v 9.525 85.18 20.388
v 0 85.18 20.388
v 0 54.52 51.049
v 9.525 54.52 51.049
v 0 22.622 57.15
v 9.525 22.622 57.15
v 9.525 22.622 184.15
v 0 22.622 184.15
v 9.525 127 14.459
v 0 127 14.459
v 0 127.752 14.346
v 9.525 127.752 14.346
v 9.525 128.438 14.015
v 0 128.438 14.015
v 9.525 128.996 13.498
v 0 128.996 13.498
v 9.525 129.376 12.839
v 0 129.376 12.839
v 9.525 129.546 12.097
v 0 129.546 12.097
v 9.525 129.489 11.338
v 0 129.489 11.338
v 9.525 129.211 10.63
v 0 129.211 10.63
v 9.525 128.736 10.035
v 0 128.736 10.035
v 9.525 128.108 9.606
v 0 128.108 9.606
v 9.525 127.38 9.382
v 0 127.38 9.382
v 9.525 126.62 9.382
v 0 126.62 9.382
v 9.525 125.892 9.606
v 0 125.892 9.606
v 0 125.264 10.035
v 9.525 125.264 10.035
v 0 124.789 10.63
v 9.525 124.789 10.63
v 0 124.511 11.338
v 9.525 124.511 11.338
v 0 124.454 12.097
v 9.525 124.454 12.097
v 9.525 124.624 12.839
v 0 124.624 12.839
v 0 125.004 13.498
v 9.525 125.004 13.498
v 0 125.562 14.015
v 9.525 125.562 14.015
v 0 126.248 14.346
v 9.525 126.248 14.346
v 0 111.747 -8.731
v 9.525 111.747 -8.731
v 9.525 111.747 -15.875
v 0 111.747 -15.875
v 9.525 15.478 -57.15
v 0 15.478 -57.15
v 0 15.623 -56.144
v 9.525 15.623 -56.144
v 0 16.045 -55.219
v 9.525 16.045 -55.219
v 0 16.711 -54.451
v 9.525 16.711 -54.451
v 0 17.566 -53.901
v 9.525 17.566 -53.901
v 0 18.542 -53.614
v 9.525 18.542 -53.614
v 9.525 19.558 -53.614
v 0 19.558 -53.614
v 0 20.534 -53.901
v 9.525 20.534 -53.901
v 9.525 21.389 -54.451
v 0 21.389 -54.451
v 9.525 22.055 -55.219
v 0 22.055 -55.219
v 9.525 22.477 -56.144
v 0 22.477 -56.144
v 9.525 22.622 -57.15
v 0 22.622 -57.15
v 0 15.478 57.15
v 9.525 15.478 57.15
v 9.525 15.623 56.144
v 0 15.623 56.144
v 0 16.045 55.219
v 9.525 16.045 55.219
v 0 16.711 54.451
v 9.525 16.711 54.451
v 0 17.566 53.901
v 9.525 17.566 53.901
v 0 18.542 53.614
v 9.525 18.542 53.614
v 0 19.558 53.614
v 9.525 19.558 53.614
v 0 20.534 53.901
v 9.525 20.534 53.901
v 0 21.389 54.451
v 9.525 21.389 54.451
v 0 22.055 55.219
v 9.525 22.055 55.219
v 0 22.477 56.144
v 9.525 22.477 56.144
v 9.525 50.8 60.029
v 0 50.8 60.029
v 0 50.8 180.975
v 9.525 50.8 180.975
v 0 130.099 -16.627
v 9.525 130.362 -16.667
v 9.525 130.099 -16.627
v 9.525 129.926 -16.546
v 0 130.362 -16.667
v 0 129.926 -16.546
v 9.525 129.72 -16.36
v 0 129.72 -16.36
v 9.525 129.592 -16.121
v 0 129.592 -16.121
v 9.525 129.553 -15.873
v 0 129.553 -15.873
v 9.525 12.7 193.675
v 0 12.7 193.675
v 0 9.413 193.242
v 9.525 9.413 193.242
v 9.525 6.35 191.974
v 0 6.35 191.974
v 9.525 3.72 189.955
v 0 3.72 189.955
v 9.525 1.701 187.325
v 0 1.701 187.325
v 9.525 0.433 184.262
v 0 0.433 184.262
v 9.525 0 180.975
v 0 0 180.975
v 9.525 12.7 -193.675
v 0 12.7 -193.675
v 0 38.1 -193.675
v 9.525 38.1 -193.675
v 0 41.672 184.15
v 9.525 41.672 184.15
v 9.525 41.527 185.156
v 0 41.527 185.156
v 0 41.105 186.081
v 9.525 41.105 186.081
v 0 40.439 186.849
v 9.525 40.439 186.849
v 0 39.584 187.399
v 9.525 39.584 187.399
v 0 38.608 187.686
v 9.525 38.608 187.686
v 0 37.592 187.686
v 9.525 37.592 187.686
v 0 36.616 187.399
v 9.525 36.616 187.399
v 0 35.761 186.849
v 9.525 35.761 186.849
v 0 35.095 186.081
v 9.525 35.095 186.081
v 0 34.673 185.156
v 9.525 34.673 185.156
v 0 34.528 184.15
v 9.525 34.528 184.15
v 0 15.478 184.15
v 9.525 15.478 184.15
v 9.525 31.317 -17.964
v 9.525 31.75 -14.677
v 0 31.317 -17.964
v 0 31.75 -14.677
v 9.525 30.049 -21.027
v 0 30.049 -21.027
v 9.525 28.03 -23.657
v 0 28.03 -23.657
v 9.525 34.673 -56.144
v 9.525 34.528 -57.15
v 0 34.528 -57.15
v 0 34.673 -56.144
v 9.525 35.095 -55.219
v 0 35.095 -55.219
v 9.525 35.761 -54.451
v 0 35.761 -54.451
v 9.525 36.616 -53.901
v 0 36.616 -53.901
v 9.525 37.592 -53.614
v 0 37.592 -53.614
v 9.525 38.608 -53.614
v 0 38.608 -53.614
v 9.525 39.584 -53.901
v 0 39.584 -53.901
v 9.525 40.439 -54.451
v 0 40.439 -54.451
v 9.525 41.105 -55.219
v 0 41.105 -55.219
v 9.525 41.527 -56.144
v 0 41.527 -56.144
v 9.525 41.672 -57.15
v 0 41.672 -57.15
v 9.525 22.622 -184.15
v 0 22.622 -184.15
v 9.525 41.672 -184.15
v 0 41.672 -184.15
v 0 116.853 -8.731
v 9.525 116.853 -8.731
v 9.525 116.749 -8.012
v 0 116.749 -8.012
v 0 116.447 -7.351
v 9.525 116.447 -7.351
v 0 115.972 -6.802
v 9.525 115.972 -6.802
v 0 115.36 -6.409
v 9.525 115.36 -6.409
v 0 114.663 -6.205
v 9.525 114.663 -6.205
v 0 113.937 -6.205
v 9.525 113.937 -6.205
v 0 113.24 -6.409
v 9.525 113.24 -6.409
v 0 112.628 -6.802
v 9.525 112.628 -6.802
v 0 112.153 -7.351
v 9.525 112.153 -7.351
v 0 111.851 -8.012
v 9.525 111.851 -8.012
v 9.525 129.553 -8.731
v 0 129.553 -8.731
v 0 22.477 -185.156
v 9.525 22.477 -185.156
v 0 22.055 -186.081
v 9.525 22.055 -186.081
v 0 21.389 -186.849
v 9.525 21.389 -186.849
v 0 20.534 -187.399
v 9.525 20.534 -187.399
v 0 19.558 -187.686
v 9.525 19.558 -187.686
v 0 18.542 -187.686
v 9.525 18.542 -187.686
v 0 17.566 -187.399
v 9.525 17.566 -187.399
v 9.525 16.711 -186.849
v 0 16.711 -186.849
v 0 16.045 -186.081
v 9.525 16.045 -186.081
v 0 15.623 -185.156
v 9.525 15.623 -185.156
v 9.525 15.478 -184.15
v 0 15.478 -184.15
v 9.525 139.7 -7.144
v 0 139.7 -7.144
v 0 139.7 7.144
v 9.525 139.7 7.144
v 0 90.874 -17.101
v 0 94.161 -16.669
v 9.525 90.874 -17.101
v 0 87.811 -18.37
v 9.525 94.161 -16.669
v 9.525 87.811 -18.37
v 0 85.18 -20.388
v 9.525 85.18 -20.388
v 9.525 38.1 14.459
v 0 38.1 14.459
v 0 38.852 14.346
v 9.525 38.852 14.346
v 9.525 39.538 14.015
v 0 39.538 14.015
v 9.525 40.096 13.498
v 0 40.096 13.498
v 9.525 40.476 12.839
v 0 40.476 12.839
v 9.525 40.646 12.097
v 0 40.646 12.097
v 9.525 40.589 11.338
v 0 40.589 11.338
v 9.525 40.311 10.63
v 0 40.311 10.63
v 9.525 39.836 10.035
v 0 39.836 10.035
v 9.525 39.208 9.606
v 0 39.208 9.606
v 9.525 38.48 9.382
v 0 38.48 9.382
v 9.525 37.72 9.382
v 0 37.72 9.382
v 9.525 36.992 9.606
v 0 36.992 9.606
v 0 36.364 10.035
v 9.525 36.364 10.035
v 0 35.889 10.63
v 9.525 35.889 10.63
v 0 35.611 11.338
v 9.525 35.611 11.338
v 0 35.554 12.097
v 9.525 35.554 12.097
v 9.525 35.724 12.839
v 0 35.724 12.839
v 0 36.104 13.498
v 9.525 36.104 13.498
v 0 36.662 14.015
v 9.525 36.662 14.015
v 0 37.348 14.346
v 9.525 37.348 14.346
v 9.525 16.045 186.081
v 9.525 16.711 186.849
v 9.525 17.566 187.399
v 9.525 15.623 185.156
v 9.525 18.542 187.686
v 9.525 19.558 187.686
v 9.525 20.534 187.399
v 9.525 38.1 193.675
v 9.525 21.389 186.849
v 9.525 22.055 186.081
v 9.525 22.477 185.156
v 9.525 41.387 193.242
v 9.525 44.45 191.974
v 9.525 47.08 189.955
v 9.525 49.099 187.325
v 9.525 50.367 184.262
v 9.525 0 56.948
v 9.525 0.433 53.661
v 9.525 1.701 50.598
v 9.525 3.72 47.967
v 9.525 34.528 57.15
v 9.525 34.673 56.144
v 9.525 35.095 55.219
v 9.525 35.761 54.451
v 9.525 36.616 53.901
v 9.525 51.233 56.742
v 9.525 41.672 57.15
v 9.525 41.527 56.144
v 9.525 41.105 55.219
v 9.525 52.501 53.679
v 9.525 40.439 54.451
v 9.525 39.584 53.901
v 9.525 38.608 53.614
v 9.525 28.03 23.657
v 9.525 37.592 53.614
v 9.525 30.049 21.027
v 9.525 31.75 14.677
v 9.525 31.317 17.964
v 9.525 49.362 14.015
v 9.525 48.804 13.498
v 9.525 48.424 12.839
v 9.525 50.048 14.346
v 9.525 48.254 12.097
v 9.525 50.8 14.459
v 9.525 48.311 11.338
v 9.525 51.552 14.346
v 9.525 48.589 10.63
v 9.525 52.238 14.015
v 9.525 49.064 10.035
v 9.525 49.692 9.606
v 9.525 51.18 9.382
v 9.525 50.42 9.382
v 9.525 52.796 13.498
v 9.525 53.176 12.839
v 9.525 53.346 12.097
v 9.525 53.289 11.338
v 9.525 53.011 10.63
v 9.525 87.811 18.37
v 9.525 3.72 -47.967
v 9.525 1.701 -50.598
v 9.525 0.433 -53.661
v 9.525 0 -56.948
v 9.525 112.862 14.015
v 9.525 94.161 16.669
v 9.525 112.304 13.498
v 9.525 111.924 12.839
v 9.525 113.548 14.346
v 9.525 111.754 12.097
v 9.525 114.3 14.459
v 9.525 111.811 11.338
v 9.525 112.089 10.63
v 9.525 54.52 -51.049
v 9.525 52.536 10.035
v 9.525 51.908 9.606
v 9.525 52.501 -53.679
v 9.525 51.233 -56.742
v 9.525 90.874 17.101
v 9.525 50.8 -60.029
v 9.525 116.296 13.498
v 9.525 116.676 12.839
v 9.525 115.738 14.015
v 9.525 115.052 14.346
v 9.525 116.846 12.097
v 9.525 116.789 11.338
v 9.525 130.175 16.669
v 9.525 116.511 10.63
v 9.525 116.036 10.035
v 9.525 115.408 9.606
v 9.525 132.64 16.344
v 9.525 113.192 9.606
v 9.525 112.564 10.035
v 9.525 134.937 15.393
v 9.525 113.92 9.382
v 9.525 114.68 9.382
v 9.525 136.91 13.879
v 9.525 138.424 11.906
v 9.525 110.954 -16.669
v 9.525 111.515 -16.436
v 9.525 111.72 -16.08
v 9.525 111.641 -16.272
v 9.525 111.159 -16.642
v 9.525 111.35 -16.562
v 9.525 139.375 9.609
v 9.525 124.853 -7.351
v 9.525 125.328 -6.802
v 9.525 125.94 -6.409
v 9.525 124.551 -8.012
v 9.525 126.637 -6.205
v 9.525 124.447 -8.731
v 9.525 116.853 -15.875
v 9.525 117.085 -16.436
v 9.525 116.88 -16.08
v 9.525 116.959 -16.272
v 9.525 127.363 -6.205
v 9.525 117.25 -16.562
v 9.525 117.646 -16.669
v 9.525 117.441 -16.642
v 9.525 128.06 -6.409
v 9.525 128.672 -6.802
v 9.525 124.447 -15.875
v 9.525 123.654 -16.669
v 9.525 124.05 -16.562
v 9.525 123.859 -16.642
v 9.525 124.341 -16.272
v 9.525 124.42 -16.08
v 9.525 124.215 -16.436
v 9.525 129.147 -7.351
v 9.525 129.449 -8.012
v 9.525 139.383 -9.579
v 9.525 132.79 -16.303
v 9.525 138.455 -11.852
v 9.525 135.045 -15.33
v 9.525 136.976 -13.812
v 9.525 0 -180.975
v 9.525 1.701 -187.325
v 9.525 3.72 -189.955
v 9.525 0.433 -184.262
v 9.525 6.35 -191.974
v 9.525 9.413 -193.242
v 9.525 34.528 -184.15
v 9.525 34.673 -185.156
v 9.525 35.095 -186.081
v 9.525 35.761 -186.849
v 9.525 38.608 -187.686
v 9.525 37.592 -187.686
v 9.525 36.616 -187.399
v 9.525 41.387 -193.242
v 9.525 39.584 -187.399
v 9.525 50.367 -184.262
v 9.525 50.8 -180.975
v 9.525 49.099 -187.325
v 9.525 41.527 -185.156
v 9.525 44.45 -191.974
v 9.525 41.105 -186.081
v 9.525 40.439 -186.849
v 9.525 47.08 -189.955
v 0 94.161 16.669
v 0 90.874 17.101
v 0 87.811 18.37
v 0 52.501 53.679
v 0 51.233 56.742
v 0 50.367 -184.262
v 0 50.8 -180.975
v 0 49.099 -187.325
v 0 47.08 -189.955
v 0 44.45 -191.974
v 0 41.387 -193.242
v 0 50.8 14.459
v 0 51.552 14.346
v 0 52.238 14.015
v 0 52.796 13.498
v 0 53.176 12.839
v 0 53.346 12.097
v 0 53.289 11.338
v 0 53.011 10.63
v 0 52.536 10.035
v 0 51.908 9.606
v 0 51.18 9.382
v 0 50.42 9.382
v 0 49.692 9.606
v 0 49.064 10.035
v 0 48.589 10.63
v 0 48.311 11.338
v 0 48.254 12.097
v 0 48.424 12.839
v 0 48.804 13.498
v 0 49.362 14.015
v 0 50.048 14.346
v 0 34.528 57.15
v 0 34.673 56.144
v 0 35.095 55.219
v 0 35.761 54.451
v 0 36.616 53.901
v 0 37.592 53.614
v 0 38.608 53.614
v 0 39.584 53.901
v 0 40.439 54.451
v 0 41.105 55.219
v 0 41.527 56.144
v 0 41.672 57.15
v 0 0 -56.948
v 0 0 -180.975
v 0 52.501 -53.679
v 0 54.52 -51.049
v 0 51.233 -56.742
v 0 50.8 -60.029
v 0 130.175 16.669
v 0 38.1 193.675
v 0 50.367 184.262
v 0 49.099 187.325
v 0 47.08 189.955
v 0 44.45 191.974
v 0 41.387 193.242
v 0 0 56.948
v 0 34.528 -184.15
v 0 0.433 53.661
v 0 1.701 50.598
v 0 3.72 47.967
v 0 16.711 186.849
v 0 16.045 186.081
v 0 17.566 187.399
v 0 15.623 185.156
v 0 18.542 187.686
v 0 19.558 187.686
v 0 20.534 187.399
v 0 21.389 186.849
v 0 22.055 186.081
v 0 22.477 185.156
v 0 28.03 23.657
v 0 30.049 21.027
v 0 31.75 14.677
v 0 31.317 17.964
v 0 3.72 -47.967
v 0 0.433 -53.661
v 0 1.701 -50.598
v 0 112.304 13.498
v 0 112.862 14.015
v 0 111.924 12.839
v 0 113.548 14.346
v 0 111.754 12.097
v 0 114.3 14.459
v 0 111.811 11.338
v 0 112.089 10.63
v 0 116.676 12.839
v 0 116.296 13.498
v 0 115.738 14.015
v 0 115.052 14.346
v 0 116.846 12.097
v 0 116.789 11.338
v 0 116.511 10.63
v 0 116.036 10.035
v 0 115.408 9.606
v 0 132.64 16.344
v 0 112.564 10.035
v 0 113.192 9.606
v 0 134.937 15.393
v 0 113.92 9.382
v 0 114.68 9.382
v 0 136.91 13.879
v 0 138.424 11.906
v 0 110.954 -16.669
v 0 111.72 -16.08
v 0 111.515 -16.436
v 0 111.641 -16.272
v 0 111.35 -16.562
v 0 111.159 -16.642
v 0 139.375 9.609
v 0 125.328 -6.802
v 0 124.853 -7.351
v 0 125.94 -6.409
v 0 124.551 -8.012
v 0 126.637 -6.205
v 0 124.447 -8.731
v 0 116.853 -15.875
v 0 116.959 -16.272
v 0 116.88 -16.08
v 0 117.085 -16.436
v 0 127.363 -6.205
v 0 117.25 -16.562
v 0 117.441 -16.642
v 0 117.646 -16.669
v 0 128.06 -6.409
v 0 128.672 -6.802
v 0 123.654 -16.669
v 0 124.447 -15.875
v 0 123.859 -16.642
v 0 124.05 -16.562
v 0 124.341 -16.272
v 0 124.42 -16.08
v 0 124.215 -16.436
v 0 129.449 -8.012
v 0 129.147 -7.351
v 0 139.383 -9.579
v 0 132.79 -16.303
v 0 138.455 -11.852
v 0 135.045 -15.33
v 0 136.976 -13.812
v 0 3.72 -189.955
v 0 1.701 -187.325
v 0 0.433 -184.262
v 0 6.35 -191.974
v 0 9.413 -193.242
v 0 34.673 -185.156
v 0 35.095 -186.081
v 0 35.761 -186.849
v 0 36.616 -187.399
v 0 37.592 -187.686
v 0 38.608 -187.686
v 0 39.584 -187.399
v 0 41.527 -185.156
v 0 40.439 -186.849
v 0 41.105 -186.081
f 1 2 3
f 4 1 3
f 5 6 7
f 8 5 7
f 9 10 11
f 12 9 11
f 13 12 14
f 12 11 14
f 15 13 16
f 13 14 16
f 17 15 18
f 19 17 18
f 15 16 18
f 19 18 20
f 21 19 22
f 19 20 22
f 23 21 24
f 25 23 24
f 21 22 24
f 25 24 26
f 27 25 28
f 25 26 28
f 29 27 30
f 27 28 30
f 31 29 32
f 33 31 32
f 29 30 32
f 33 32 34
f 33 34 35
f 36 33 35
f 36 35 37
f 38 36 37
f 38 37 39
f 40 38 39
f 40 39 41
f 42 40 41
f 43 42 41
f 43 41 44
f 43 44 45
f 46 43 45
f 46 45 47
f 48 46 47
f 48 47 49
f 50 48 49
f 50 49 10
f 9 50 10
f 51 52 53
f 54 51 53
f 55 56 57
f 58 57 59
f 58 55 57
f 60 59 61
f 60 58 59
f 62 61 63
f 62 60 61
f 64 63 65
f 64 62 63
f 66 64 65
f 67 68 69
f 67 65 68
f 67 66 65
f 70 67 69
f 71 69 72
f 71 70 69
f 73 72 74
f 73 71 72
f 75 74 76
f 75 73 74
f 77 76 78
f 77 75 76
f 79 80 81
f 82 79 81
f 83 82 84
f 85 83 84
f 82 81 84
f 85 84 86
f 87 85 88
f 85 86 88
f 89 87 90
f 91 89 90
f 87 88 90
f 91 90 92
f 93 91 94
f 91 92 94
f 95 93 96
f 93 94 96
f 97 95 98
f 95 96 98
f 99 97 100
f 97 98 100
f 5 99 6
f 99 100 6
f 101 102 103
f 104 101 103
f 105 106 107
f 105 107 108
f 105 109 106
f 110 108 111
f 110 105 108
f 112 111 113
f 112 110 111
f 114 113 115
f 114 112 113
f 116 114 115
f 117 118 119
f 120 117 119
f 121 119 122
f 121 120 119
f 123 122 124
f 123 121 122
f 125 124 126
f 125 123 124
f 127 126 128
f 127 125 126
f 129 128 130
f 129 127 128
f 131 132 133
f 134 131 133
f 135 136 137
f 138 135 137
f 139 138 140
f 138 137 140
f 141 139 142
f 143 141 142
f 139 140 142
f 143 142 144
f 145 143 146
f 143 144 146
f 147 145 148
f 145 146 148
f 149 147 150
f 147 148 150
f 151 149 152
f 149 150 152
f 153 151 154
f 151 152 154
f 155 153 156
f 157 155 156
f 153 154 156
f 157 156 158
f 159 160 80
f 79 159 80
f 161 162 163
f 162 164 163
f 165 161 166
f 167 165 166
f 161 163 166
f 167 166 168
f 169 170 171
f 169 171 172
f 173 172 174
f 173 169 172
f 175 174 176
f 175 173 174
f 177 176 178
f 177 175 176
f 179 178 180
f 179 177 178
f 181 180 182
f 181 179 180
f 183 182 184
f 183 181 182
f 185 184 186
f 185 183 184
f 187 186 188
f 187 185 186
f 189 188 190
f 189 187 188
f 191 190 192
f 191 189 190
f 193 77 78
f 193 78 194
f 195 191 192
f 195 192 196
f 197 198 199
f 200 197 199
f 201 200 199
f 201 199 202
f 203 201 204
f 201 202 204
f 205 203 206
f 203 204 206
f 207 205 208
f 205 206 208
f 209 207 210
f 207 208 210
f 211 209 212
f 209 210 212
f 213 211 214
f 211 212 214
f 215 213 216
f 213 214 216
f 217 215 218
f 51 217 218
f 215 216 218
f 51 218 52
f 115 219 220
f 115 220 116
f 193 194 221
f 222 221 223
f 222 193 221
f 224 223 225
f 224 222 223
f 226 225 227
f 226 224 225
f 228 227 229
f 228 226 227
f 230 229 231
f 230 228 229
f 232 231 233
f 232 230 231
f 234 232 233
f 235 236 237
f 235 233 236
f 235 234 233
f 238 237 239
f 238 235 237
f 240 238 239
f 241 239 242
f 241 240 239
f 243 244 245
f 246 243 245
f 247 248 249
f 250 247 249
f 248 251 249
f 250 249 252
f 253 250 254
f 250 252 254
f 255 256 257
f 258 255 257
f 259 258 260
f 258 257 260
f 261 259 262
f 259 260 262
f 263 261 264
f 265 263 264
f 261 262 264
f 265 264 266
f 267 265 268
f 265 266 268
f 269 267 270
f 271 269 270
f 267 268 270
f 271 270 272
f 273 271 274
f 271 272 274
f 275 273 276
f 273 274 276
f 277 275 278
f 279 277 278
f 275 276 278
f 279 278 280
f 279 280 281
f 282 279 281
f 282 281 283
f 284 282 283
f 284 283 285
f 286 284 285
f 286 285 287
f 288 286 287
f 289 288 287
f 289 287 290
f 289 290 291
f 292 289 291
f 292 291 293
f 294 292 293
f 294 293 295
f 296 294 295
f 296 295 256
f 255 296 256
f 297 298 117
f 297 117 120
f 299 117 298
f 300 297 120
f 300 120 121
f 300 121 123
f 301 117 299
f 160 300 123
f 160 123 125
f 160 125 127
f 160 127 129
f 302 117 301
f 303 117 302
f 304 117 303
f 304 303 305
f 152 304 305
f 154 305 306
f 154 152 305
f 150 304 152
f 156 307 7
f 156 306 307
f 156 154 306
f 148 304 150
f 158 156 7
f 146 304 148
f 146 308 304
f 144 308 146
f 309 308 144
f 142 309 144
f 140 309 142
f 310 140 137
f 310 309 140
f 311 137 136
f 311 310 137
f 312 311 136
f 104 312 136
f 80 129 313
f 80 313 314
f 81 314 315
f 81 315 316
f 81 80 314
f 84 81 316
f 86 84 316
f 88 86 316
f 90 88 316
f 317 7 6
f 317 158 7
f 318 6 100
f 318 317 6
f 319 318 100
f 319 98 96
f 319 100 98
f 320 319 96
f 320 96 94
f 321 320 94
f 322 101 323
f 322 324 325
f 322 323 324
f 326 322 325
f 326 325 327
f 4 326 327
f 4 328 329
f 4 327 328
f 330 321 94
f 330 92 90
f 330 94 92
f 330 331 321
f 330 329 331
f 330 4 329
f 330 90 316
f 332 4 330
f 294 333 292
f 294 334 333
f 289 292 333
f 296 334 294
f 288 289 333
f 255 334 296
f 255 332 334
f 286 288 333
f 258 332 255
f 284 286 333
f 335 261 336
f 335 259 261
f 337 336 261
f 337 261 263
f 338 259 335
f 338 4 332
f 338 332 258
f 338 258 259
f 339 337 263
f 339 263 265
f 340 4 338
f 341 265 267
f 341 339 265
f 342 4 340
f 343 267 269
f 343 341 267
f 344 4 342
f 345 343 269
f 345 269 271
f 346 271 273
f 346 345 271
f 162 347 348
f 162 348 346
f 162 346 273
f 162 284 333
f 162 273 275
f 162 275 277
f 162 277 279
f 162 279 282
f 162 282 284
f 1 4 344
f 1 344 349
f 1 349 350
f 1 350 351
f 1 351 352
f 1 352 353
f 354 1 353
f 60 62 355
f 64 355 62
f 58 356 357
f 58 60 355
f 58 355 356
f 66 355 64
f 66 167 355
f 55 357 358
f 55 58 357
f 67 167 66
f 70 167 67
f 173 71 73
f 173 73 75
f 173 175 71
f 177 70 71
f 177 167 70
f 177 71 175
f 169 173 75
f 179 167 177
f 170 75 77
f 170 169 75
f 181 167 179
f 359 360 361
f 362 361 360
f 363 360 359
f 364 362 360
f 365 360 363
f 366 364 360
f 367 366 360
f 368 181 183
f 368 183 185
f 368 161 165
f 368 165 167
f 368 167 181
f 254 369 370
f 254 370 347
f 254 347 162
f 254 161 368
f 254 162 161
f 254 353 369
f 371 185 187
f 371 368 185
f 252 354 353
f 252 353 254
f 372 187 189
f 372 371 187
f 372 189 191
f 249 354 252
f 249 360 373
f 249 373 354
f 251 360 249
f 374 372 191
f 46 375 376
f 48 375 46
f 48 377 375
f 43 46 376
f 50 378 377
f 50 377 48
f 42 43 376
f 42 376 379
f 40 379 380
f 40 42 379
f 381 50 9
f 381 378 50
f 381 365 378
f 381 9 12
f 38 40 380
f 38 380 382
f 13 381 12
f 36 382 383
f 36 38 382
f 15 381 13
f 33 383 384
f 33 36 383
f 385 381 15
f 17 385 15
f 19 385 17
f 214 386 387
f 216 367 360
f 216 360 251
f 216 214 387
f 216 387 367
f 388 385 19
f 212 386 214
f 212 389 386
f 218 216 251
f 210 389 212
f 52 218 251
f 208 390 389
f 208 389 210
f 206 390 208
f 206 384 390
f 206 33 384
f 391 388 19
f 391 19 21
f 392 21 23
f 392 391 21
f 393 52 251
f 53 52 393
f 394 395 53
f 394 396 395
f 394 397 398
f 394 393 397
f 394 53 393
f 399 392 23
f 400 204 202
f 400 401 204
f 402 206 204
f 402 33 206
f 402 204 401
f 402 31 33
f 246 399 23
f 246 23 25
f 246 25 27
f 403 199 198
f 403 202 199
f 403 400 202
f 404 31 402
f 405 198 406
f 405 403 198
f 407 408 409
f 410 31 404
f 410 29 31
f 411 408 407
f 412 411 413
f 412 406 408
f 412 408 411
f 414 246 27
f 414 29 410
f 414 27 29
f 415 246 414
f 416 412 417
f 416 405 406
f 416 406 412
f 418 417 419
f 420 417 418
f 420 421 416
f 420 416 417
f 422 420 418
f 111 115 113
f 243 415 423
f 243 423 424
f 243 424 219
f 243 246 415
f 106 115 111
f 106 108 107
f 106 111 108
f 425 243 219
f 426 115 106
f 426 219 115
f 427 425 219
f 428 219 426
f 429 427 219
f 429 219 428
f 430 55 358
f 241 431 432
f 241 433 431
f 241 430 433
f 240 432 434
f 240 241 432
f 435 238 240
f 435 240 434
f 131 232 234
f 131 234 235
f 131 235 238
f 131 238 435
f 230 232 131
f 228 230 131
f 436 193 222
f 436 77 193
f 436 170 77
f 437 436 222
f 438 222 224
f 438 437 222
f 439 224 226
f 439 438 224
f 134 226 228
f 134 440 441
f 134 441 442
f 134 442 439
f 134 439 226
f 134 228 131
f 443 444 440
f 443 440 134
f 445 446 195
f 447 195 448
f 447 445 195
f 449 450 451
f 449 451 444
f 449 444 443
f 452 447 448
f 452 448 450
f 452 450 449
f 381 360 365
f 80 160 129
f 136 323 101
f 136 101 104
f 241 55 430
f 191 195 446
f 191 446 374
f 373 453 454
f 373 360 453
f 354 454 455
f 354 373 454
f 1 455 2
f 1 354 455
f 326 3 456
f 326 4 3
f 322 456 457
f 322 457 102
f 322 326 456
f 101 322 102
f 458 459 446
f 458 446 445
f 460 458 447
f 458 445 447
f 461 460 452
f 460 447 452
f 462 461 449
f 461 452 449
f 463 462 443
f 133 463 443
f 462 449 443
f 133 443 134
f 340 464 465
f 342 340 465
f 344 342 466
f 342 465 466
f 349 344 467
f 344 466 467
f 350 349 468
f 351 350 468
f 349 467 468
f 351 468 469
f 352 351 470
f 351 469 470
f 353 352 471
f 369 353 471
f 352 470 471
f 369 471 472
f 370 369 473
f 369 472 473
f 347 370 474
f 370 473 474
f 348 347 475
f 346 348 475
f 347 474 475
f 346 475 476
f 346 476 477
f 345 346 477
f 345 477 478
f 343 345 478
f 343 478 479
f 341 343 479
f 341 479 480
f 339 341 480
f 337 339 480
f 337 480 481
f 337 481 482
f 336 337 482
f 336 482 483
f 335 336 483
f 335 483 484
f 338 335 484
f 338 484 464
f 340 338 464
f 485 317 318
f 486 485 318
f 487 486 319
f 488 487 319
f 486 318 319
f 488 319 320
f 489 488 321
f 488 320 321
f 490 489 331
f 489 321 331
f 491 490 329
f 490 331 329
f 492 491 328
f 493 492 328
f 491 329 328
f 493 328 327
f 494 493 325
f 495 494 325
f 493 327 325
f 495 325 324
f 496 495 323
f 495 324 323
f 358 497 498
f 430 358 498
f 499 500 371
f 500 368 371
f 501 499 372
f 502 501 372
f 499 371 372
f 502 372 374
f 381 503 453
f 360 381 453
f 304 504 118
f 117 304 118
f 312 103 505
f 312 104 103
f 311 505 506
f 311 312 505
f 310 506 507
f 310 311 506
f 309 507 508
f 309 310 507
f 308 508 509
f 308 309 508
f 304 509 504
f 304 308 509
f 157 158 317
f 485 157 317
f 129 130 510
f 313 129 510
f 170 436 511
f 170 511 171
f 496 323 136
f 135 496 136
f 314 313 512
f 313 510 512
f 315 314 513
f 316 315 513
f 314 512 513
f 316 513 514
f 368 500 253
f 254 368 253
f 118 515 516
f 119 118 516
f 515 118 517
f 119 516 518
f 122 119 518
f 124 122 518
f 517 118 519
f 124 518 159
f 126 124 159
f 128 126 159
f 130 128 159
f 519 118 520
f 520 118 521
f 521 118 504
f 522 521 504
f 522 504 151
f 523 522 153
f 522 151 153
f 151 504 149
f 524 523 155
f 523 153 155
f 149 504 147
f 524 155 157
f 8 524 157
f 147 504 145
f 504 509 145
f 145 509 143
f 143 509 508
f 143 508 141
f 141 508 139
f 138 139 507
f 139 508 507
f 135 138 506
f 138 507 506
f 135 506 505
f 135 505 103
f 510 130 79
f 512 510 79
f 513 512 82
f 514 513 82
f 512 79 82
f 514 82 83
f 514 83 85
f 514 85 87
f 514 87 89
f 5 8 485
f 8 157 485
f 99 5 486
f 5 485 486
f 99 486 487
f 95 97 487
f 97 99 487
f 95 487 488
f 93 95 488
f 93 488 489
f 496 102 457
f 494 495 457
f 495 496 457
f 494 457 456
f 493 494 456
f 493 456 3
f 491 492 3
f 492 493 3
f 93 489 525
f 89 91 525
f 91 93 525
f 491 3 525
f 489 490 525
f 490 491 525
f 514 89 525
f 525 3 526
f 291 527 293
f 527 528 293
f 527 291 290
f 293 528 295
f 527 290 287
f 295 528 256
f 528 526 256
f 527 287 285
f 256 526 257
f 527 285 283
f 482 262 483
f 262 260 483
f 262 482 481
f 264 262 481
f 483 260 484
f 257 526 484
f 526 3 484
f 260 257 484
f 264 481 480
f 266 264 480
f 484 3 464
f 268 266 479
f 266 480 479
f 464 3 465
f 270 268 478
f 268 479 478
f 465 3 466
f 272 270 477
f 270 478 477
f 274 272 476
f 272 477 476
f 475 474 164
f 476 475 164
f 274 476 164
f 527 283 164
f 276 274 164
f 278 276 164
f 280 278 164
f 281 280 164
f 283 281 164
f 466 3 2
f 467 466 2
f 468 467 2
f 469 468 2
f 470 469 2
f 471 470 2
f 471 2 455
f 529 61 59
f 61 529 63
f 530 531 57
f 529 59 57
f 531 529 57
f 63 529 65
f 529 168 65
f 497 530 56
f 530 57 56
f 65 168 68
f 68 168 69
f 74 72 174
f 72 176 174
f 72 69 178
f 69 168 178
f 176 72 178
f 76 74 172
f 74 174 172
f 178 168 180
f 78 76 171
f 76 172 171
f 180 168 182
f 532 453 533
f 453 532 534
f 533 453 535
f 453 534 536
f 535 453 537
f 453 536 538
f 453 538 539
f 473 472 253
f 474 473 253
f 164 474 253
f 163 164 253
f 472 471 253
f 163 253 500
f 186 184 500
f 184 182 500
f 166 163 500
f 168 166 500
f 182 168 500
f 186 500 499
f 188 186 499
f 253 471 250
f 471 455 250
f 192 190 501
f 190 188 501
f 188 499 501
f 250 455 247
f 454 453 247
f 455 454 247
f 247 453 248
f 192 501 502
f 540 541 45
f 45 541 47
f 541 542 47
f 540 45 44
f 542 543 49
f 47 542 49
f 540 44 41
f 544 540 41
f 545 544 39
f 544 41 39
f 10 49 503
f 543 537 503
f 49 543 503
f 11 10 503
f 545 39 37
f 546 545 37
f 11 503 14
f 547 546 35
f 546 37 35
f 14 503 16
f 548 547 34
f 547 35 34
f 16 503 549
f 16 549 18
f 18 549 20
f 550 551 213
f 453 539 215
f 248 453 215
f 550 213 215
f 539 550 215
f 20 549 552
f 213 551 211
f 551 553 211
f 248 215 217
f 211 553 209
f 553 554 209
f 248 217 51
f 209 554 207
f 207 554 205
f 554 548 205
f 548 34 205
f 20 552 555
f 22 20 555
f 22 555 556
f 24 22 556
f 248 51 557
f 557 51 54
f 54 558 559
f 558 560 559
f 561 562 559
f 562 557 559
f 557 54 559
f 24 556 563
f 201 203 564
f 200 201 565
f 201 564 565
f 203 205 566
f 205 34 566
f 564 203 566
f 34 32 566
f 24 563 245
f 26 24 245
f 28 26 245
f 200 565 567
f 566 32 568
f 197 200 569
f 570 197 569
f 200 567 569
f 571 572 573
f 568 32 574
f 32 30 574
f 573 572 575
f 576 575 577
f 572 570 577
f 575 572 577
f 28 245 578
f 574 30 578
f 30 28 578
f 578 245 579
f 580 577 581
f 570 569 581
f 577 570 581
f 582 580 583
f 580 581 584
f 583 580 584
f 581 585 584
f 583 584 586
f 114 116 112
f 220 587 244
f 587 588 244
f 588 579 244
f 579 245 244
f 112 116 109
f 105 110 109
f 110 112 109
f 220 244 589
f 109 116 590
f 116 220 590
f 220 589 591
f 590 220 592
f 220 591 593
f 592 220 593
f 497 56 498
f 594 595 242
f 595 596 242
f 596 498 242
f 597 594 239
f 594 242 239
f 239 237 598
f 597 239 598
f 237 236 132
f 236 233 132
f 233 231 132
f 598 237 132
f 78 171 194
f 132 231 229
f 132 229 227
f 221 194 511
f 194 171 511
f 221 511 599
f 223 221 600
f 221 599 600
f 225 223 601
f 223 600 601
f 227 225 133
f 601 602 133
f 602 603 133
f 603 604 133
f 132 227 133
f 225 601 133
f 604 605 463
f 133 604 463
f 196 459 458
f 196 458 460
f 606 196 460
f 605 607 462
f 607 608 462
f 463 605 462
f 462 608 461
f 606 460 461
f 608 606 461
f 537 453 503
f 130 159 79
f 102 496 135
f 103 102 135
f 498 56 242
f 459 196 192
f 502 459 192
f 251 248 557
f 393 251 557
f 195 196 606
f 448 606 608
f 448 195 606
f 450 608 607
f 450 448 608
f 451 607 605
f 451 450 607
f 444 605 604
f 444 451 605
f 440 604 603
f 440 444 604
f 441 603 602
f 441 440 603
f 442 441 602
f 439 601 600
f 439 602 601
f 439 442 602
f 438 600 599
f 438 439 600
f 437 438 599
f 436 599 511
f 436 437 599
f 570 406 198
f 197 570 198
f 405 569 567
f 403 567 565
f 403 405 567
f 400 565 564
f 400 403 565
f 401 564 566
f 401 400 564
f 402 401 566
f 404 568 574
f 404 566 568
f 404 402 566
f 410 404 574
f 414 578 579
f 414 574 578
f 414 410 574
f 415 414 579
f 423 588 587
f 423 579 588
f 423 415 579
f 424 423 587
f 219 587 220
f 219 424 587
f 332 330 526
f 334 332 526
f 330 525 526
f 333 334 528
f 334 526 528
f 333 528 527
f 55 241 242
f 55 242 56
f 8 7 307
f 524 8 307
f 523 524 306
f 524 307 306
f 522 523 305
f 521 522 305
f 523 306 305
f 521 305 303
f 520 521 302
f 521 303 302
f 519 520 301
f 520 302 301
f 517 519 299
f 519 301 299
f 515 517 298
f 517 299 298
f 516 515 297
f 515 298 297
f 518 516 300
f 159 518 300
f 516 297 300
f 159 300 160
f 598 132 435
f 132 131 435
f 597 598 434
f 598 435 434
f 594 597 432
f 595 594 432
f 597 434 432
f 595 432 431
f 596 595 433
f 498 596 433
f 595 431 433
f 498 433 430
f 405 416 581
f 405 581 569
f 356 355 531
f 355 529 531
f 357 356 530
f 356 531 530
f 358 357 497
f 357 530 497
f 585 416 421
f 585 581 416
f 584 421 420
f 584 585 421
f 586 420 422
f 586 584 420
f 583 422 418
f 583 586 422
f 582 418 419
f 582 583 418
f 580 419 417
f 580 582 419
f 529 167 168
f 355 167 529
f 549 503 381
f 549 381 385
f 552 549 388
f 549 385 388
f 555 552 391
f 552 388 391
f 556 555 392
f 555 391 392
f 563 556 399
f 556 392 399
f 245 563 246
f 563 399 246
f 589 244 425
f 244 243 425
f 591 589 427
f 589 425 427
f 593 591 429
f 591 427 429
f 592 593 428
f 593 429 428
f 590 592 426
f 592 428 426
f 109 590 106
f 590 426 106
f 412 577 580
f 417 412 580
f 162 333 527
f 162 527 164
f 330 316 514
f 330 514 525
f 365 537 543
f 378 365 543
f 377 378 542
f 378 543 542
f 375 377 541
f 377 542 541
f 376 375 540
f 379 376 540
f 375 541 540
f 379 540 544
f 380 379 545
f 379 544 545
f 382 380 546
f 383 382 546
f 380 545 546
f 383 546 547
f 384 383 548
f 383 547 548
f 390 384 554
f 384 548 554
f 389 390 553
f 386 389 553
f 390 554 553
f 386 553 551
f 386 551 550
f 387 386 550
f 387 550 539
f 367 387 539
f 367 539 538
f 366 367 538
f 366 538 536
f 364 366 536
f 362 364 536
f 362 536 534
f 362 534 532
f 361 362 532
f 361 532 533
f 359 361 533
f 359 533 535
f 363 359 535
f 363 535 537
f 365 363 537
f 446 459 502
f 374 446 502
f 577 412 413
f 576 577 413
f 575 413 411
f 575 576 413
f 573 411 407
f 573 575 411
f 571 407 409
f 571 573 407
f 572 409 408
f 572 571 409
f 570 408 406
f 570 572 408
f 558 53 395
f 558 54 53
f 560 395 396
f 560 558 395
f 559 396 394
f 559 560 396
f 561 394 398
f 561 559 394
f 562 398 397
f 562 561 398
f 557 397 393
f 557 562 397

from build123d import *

# Parameters (mm, degrees)
BOSS_EXTRUDE1_DEPTH    = 9.525
CUT_EXTRUDE1_DEPTH     = 239.991257685
CUT_EXTRUDE3_DEPTH     = 239.991257685
F_10_CLEARANCE_HOLE1_D = 5.1054
FILLET1_R              = 9.525
FILLET2_R              = 12.7
CUT_EXTRUDE4_DEPTH     = 239.991257685
FILLET3_R              = 0.79375


with BuildPart() as part:
    # Sketch1 → Boss-Extrude1 (new body)
    with BuildSketch(Plane(origin=(0, 0, 0), x_dir=(0, 0, -1), z_dir=(1, 0, 0))):
        Polygon((-193.675, 0), (193.675, 0), (193.675, 50.8), (54.76875, 50.8), (16.66875, 88.9), (16.66875, 139.7), (-16.66875, 139.7), (-16.66875, 88.9), (-54.76875, 50.8), (-193.675, 50.8), align=None)
    extrude(amount=BOSS_EXTRUDE1_DEPTH)

    # Sketch2 → Cut-Extrude1 (cut, through all)
    with BuildSketch(Plane(origin=(9.525, 0, 0), x_dir=(0, 0, -1), z_dir=(1, 0, 0))):
        with BuildLine():
            Line((-184.15, 34.528125), (-57.15, 34.528125))
            ThreePointArc((-57.15, 34.528125), (-53.578125, 38.1), (-57.15, 41.671875))
            Line((-57.15, 41.671875), (-184.15, 41.671875))
            ThreePointArc((-184.15, 41.671875), (-187.721875, 38.1), (-184.15, 34.528125))
        make_face()
        with BuildLine():
            Line((-184.15, 15.478125), (-57.15, 15.478125))
            ThreePointArc((-57.15, 15.478125), (-53.578125, 19.05), (-57.15, 22.621875))
            Line((-57.15, 22.621875), (-184.15, 22.621875))
            ThreePointArc((-184.15, 22.621875), (-187.721875, 19.05), (-184.15, 15.478125))
        make_face()
    cut_extrude1 = extrude(amount=-CUT_EXTRUDE1_DEPTH, mode=Mode.SUBTRACT)

    # Mirror1: Cut-Extrude1 across plane
    add(cut_extrude1.mirror(Plane.XY), mode=Mode.SUBTRACT)

    # Sketch4 → Cut-Extrude3 (cut, through all)
    with BuildSketch(Plane(origin=(9.525, 0, 0), x_dir=(0, 0, -1), z_dir=(1, 0, 0))):
        Polygon((-51.687213274, 0), (-19.937213274, 31.75), (19.937213274, 31.75), (51.687213274, 0), align=None)
    extrude(amount=-CUT_EXTRUDE3_DEPTH, mode=Mode.SUBTRACT)

    # #10 Clearance Hole1 (through all)
    with Locations(Plane(origin=(9.525, 0, 0), x_dir=(0, 0, -1), z_dir=(1, 0, 0))):
        with Locations((-11.90625, 127), (11.90625, 127), (-11.90625, 114.3), (-11.90625, 38.1), (11.90625, 114.3), (-11.90625, 50.8)):
            Hole(F_10_CLEARANCE_HOLE1_D / 2)

    # Fillet1
    fillet1_edges = [part.edges().sort_by_distance(p)[0] for p in [
        (4.7625, 139.7, 16.66875),
        (4.7625, 139.7, -16.66875),
    ]]
    fillet(fillet1_edges, radius=FILLET1_R)

    # Fillet2
    fillet2_edges = [part.edges().sort_by_distance(p)[0] for p in [
        (4.7625, 50.8, 193.675),
        (4.7625, 50.8, 54.76875),
        (4.7625, 88.9, 16.66875),
        (4.7625, 88.9, -16.66875),
        (4.7625, 50.8, -54.76875),
        (4.7625, 50.8, -193.675),
        (4.7625, 0, -193.675),
        (4.7625, 0, 193.675),
        (4.7625, 31.75, 19.937213274),
        (4.7625, 31.75, -19.937213274),
        (4.7625, 0, -51.687213274),
        (4.7625, 0, 51.687213274),
    ]]
    fillet(fillet2_edges, radius=FILLET2_R)

    # Sketch7 → Cut-Extrude4 (cut, through all)
    with BuildSketch(Plane(origin=(9.525, 0, 0), x_dir=(0, 0, -1), z_dir=(1, 0, 0))):
        with BuildLine():
            Line((11.90625, 129.5527), (16.66875, 129.5527))
            ThreePointArc((16.66875, 129.5527), (19.22145, 127), (16.66875, 124.4473))
            Line((16.66875, 124.4473), (11.90625, 124.4473))
            Line((11.90625, 124.4473), (8.73125, 124.4473))
            ThreePointArc((8.73125, 124.4473), (6.17855, 127), (8.73125, 129.5527))
            Line((8.73125, 129.5527), (11.90625, 129.5527))
        make_face()
        with BuildLine():
            Line((16.66875, 116.8527), (11.90625, 116.8527))
            Line((11.90625, 116.8527), (8.73125, 116.8527))
            ThreePointArc((8.73125, 116.8527), (6.17855, 114.3), (8.73125, 111.7473))
            Line((8.73125, 111.7473), (11.90625, 111.7473))
            Line((11.90625, 111.7473), (16.66875, 111.7473))
            ThreePointArc((16.66875, 111.7473), (19.22145, 114.3), (16.66875, 116.8527))
        make_face()
    extrude(amount=-CUT_EXTRUDE4_DEPTH, mode=Mode.SUBTRACT)

    # Fillet3
    fillet3_edges = [part.edges().sort_by_distance(p)[0] for p in [
        (4.7625, 111.7473, -16.66875),
        (4.7625, 116.8527, -16.66875),
        (4.7625, 124.4473, -16.66875),
        (4.7625, 129.5527, -16.66875),
    ]]
    fillet(fillet3_edges, radius=FILLET3_R)


solid = part.part
